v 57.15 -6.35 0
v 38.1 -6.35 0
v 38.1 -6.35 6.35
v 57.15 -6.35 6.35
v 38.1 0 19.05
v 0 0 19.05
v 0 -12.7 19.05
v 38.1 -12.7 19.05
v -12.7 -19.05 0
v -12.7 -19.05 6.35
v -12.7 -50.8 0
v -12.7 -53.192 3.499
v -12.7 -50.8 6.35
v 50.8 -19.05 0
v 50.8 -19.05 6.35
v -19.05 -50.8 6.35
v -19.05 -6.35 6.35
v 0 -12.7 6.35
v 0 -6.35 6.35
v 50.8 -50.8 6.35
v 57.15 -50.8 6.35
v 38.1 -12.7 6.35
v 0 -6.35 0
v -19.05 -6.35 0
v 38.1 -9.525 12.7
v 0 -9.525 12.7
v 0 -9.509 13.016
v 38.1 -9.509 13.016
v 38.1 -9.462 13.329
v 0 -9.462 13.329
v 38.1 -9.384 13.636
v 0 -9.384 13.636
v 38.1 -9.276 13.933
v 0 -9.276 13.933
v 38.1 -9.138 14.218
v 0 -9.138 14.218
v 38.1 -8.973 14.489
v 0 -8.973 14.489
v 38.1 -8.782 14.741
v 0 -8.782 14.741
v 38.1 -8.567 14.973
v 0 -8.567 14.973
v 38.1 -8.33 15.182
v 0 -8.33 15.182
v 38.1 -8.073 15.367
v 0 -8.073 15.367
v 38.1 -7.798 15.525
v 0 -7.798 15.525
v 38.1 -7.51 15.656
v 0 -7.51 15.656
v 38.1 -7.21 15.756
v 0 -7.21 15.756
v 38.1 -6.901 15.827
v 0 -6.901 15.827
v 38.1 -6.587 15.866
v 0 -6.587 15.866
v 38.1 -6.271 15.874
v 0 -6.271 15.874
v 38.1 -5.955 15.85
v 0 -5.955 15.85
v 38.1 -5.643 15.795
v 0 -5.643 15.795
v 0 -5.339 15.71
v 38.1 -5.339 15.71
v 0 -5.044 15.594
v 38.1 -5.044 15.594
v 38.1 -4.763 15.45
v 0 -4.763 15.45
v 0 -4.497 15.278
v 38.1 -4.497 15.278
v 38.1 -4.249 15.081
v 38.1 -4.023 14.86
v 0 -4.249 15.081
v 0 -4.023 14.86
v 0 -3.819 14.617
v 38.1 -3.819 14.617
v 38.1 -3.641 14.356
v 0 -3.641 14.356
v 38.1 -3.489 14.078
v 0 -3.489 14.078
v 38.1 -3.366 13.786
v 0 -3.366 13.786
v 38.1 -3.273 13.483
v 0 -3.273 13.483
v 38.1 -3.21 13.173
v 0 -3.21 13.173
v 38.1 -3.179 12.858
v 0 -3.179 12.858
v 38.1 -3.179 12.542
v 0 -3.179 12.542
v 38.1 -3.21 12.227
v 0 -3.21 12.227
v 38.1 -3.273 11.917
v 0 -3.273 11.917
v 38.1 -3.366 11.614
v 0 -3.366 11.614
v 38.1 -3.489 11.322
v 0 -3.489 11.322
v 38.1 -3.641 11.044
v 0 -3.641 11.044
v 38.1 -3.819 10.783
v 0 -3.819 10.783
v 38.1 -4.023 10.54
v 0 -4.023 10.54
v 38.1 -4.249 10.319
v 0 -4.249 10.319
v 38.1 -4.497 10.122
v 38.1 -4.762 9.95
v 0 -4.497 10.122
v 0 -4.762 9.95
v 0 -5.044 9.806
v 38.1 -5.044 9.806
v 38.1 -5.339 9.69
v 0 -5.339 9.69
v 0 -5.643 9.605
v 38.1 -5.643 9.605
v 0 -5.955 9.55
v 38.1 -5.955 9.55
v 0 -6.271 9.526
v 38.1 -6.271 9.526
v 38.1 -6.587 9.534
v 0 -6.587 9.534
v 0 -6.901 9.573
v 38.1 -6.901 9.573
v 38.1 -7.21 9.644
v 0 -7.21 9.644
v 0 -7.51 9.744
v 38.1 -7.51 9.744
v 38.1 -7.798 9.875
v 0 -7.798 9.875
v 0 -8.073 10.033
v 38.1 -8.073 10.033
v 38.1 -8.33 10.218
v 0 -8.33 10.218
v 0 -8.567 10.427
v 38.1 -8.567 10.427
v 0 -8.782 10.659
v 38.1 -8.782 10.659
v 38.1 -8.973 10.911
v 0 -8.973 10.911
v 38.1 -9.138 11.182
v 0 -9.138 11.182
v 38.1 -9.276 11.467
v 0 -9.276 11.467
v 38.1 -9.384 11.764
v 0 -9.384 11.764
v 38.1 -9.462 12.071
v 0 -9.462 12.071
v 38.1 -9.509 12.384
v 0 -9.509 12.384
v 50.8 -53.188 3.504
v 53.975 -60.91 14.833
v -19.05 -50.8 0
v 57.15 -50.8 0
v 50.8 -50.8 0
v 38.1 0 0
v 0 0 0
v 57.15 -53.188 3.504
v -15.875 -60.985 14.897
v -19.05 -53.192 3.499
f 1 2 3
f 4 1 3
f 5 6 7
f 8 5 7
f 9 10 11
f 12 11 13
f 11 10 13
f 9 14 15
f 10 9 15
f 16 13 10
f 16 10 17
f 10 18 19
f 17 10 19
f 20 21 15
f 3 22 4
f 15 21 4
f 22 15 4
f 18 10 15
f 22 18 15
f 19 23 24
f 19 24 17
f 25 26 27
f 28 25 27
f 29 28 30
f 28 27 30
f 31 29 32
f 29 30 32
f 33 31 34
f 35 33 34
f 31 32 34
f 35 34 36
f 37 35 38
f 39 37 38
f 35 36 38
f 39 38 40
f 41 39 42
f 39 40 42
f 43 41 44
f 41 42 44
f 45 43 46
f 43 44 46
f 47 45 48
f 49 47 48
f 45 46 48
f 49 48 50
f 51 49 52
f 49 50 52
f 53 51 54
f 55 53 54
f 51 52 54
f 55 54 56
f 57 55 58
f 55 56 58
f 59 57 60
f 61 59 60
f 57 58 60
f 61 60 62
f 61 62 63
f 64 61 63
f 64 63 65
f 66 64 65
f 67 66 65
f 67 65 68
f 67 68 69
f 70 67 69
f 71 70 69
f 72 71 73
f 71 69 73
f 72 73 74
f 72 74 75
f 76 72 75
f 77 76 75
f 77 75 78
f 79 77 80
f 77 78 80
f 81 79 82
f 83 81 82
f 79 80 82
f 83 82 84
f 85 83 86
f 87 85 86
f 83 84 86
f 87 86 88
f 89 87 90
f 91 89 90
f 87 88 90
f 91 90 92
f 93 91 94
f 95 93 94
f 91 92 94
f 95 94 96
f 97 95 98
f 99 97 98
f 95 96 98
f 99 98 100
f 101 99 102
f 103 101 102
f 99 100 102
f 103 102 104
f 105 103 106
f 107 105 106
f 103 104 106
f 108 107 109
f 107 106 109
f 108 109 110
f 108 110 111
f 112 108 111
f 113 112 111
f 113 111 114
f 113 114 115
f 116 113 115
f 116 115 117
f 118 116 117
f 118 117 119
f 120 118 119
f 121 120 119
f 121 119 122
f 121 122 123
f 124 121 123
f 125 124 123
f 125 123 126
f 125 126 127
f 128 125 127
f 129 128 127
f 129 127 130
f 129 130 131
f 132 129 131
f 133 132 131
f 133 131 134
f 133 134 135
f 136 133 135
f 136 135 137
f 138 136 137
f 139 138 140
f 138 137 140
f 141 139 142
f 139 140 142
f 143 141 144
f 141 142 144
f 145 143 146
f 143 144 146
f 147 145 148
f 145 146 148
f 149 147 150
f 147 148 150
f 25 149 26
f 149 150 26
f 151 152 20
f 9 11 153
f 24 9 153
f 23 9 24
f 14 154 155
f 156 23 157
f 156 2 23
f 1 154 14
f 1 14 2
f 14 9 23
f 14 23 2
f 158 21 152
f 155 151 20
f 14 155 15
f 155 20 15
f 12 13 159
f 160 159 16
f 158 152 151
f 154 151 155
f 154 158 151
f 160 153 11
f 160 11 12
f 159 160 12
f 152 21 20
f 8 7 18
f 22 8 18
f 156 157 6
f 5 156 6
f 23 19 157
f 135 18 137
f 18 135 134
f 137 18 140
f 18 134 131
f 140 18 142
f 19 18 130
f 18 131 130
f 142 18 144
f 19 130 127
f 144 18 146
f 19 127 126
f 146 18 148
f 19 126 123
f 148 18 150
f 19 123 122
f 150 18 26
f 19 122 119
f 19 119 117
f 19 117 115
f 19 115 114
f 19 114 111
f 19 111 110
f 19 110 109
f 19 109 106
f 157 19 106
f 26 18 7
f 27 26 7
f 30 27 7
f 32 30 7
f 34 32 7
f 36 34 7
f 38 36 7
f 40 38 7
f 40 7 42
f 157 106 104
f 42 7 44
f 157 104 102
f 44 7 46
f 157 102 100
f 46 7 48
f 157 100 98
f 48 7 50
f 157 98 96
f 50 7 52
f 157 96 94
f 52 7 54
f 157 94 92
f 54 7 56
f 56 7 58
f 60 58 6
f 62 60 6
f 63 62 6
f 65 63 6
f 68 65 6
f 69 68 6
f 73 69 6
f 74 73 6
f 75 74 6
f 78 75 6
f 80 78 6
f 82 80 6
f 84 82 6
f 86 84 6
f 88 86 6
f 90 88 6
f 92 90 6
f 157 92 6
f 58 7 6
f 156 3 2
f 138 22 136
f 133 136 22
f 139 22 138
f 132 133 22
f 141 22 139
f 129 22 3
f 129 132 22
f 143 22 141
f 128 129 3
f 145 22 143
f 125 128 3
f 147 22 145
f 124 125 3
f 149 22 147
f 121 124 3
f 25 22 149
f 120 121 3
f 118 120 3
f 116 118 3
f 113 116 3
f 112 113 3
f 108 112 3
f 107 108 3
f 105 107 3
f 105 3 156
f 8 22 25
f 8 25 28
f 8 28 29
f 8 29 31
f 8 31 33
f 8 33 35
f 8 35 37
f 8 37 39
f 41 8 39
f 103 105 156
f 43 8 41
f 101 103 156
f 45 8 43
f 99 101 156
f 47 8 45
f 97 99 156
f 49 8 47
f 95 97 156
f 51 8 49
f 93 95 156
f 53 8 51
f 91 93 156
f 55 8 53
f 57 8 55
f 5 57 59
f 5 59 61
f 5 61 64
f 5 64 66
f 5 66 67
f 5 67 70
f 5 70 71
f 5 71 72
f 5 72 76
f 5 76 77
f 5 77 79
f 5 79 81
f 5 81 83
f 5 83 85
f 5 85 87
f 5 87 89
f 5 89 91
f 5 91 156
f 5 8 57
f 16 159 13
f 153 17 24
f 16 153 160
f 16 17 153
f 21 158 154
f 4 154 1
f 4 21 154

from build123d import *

# Parameters (mm, degrees)
F1_DEPTH  = 38.1
F2_W      = 6.35
F2_H      = 6.35
F3_DEPTH  = 57.15
F2_W_2    = 12.7
F4_DEPTH  = 19.05
F5_W      = 31.75
F5_H      = 6.35
F6_DEPTH  = 6.35
F7_W      = 31.75
F7_H      = 6.35
F8_DEPTH  = 6.35
F10_DEPTH = 25.4
F12_DEPTH = 25.4


with BuildPart() as f1:
    # F0 (on Right) → F1 (new body)
    with BuildSketch(Plane.YZ):
        with BuildLine():
            Line((-12.7, 0), (0, 0))
            Line((0, 0), (0, 12.7))
            Line((0, 12.7), (-3.175, 12.7))
            ThreePointArc((-3.175, 12.7), (-6.35, 9.525), (-9.525, 12.7))
            Line((-9.525, 12.7), (-12.7, 12.7))
            Line((-12.7, 12.7), (-12.7, 0))
        make_face()
        with BuildLine():
            Line((-3.175, 12.7), (0, 12.7))
            Line((0, 12.7), (0, 19.05))
            Line((0, 19.05), (-12.7, 19.05))
            Line((-12.7, 19.05), (-12.7, 12.7))
            Line((-12.7, 12.7), (-9.525, 12.7))
            ThreePointArc((-9.525, 12.7), (-6.35, 15.875), (-3.175, 12.7))
        make_face()
    extrude(amount=F1_DEPTH)

    # F2 (on face) → F3 (join)
    with BuildSketch(Plane(origin=(0, 0, 0), x_dir=(0, -1, 0), z_dir=(-1, 0, 0))):
        with Locations((9.525, 3.175)):
            Rectangle(F2_W, F2_H)
        with Locations((15.875, 3.175)):
            Rectangle(F2_W, F2_H)
    extrude(amount=-F3_DEPTH)

    # F2 (on face) → F4 (join)
    with BuildSketch(Plane(origin=(0, 0, 0), x_dir=(0, -1, 0), z_dir=(-1, 0, 0))):
        with Locations((12.7, 3.175)):
            Rectangle(F2_W_2, F2_H)
    extrude(amount=F4_DEPTH)

    # F5 (on face) → F6 (join)
    with BuildSketch(Plane(origin=(-19.05, 0, 0), x_dir=(0, -1, 0), z_dir=(-1, 0, 0))):
        with Locations((34.925, 3.175)):
            Rectangle(F5_W, F5_H)
        Polygon((60.985425, 14.896587), (50.8, 6.35), (50.8, 0), align=None)
    extrude(amount=-F6_DEPTH)

    # F7 (on face) → F8 (join)
    with BuildSketch(Plane.YZ.offset(57.15)):
        Polygon((-50.8, 0), (-50.8, 6.35), (-60.910088, 14.833371), align=None)
        with Locations((-34.925, 3.175)):
            Rectangle(F7_W, F7_H)
    extrude(amount=-F8_DEPTH)

    # F9 (on face) → F10 (cut)
    with BuildSketch(Plane(origin=(0, -17.862572, -21.287784), x_dir=(1, 0, 0), z_dir=(0, 0.642788, 0.766044))):
        Polygon((-15.875, -56.292887), (-19.05, -42.996759), (-19.05, -56.292887), align=None)
        Polygon((-12.7, -42.996759), (-15.875, -56.292887), (-12.7, -56.292887), align=None)
    extrude(amount=-F10_DEPTH, mode=Mode.SUBTRACT)

    # F11 (on face) → F12 (cut)
    with BuildSketch(Plane(origin=(0, -17.862572, -21.287784), x_dir=(1, 0, 0), z_dir=(0, 0.642788, 0.766044))):
        Polygon((57.15, -42.996759), (53.975, -56.194541), (57.15, -56.194541), align=None)
        Polygon((50.8, -56.194541), (53.975, -56.194541), (50.8, -42.996759), align=None)
    extrude(amount=-F12_DEPTH, mode=Mode.SUBTRACT)


solid = f1.part
